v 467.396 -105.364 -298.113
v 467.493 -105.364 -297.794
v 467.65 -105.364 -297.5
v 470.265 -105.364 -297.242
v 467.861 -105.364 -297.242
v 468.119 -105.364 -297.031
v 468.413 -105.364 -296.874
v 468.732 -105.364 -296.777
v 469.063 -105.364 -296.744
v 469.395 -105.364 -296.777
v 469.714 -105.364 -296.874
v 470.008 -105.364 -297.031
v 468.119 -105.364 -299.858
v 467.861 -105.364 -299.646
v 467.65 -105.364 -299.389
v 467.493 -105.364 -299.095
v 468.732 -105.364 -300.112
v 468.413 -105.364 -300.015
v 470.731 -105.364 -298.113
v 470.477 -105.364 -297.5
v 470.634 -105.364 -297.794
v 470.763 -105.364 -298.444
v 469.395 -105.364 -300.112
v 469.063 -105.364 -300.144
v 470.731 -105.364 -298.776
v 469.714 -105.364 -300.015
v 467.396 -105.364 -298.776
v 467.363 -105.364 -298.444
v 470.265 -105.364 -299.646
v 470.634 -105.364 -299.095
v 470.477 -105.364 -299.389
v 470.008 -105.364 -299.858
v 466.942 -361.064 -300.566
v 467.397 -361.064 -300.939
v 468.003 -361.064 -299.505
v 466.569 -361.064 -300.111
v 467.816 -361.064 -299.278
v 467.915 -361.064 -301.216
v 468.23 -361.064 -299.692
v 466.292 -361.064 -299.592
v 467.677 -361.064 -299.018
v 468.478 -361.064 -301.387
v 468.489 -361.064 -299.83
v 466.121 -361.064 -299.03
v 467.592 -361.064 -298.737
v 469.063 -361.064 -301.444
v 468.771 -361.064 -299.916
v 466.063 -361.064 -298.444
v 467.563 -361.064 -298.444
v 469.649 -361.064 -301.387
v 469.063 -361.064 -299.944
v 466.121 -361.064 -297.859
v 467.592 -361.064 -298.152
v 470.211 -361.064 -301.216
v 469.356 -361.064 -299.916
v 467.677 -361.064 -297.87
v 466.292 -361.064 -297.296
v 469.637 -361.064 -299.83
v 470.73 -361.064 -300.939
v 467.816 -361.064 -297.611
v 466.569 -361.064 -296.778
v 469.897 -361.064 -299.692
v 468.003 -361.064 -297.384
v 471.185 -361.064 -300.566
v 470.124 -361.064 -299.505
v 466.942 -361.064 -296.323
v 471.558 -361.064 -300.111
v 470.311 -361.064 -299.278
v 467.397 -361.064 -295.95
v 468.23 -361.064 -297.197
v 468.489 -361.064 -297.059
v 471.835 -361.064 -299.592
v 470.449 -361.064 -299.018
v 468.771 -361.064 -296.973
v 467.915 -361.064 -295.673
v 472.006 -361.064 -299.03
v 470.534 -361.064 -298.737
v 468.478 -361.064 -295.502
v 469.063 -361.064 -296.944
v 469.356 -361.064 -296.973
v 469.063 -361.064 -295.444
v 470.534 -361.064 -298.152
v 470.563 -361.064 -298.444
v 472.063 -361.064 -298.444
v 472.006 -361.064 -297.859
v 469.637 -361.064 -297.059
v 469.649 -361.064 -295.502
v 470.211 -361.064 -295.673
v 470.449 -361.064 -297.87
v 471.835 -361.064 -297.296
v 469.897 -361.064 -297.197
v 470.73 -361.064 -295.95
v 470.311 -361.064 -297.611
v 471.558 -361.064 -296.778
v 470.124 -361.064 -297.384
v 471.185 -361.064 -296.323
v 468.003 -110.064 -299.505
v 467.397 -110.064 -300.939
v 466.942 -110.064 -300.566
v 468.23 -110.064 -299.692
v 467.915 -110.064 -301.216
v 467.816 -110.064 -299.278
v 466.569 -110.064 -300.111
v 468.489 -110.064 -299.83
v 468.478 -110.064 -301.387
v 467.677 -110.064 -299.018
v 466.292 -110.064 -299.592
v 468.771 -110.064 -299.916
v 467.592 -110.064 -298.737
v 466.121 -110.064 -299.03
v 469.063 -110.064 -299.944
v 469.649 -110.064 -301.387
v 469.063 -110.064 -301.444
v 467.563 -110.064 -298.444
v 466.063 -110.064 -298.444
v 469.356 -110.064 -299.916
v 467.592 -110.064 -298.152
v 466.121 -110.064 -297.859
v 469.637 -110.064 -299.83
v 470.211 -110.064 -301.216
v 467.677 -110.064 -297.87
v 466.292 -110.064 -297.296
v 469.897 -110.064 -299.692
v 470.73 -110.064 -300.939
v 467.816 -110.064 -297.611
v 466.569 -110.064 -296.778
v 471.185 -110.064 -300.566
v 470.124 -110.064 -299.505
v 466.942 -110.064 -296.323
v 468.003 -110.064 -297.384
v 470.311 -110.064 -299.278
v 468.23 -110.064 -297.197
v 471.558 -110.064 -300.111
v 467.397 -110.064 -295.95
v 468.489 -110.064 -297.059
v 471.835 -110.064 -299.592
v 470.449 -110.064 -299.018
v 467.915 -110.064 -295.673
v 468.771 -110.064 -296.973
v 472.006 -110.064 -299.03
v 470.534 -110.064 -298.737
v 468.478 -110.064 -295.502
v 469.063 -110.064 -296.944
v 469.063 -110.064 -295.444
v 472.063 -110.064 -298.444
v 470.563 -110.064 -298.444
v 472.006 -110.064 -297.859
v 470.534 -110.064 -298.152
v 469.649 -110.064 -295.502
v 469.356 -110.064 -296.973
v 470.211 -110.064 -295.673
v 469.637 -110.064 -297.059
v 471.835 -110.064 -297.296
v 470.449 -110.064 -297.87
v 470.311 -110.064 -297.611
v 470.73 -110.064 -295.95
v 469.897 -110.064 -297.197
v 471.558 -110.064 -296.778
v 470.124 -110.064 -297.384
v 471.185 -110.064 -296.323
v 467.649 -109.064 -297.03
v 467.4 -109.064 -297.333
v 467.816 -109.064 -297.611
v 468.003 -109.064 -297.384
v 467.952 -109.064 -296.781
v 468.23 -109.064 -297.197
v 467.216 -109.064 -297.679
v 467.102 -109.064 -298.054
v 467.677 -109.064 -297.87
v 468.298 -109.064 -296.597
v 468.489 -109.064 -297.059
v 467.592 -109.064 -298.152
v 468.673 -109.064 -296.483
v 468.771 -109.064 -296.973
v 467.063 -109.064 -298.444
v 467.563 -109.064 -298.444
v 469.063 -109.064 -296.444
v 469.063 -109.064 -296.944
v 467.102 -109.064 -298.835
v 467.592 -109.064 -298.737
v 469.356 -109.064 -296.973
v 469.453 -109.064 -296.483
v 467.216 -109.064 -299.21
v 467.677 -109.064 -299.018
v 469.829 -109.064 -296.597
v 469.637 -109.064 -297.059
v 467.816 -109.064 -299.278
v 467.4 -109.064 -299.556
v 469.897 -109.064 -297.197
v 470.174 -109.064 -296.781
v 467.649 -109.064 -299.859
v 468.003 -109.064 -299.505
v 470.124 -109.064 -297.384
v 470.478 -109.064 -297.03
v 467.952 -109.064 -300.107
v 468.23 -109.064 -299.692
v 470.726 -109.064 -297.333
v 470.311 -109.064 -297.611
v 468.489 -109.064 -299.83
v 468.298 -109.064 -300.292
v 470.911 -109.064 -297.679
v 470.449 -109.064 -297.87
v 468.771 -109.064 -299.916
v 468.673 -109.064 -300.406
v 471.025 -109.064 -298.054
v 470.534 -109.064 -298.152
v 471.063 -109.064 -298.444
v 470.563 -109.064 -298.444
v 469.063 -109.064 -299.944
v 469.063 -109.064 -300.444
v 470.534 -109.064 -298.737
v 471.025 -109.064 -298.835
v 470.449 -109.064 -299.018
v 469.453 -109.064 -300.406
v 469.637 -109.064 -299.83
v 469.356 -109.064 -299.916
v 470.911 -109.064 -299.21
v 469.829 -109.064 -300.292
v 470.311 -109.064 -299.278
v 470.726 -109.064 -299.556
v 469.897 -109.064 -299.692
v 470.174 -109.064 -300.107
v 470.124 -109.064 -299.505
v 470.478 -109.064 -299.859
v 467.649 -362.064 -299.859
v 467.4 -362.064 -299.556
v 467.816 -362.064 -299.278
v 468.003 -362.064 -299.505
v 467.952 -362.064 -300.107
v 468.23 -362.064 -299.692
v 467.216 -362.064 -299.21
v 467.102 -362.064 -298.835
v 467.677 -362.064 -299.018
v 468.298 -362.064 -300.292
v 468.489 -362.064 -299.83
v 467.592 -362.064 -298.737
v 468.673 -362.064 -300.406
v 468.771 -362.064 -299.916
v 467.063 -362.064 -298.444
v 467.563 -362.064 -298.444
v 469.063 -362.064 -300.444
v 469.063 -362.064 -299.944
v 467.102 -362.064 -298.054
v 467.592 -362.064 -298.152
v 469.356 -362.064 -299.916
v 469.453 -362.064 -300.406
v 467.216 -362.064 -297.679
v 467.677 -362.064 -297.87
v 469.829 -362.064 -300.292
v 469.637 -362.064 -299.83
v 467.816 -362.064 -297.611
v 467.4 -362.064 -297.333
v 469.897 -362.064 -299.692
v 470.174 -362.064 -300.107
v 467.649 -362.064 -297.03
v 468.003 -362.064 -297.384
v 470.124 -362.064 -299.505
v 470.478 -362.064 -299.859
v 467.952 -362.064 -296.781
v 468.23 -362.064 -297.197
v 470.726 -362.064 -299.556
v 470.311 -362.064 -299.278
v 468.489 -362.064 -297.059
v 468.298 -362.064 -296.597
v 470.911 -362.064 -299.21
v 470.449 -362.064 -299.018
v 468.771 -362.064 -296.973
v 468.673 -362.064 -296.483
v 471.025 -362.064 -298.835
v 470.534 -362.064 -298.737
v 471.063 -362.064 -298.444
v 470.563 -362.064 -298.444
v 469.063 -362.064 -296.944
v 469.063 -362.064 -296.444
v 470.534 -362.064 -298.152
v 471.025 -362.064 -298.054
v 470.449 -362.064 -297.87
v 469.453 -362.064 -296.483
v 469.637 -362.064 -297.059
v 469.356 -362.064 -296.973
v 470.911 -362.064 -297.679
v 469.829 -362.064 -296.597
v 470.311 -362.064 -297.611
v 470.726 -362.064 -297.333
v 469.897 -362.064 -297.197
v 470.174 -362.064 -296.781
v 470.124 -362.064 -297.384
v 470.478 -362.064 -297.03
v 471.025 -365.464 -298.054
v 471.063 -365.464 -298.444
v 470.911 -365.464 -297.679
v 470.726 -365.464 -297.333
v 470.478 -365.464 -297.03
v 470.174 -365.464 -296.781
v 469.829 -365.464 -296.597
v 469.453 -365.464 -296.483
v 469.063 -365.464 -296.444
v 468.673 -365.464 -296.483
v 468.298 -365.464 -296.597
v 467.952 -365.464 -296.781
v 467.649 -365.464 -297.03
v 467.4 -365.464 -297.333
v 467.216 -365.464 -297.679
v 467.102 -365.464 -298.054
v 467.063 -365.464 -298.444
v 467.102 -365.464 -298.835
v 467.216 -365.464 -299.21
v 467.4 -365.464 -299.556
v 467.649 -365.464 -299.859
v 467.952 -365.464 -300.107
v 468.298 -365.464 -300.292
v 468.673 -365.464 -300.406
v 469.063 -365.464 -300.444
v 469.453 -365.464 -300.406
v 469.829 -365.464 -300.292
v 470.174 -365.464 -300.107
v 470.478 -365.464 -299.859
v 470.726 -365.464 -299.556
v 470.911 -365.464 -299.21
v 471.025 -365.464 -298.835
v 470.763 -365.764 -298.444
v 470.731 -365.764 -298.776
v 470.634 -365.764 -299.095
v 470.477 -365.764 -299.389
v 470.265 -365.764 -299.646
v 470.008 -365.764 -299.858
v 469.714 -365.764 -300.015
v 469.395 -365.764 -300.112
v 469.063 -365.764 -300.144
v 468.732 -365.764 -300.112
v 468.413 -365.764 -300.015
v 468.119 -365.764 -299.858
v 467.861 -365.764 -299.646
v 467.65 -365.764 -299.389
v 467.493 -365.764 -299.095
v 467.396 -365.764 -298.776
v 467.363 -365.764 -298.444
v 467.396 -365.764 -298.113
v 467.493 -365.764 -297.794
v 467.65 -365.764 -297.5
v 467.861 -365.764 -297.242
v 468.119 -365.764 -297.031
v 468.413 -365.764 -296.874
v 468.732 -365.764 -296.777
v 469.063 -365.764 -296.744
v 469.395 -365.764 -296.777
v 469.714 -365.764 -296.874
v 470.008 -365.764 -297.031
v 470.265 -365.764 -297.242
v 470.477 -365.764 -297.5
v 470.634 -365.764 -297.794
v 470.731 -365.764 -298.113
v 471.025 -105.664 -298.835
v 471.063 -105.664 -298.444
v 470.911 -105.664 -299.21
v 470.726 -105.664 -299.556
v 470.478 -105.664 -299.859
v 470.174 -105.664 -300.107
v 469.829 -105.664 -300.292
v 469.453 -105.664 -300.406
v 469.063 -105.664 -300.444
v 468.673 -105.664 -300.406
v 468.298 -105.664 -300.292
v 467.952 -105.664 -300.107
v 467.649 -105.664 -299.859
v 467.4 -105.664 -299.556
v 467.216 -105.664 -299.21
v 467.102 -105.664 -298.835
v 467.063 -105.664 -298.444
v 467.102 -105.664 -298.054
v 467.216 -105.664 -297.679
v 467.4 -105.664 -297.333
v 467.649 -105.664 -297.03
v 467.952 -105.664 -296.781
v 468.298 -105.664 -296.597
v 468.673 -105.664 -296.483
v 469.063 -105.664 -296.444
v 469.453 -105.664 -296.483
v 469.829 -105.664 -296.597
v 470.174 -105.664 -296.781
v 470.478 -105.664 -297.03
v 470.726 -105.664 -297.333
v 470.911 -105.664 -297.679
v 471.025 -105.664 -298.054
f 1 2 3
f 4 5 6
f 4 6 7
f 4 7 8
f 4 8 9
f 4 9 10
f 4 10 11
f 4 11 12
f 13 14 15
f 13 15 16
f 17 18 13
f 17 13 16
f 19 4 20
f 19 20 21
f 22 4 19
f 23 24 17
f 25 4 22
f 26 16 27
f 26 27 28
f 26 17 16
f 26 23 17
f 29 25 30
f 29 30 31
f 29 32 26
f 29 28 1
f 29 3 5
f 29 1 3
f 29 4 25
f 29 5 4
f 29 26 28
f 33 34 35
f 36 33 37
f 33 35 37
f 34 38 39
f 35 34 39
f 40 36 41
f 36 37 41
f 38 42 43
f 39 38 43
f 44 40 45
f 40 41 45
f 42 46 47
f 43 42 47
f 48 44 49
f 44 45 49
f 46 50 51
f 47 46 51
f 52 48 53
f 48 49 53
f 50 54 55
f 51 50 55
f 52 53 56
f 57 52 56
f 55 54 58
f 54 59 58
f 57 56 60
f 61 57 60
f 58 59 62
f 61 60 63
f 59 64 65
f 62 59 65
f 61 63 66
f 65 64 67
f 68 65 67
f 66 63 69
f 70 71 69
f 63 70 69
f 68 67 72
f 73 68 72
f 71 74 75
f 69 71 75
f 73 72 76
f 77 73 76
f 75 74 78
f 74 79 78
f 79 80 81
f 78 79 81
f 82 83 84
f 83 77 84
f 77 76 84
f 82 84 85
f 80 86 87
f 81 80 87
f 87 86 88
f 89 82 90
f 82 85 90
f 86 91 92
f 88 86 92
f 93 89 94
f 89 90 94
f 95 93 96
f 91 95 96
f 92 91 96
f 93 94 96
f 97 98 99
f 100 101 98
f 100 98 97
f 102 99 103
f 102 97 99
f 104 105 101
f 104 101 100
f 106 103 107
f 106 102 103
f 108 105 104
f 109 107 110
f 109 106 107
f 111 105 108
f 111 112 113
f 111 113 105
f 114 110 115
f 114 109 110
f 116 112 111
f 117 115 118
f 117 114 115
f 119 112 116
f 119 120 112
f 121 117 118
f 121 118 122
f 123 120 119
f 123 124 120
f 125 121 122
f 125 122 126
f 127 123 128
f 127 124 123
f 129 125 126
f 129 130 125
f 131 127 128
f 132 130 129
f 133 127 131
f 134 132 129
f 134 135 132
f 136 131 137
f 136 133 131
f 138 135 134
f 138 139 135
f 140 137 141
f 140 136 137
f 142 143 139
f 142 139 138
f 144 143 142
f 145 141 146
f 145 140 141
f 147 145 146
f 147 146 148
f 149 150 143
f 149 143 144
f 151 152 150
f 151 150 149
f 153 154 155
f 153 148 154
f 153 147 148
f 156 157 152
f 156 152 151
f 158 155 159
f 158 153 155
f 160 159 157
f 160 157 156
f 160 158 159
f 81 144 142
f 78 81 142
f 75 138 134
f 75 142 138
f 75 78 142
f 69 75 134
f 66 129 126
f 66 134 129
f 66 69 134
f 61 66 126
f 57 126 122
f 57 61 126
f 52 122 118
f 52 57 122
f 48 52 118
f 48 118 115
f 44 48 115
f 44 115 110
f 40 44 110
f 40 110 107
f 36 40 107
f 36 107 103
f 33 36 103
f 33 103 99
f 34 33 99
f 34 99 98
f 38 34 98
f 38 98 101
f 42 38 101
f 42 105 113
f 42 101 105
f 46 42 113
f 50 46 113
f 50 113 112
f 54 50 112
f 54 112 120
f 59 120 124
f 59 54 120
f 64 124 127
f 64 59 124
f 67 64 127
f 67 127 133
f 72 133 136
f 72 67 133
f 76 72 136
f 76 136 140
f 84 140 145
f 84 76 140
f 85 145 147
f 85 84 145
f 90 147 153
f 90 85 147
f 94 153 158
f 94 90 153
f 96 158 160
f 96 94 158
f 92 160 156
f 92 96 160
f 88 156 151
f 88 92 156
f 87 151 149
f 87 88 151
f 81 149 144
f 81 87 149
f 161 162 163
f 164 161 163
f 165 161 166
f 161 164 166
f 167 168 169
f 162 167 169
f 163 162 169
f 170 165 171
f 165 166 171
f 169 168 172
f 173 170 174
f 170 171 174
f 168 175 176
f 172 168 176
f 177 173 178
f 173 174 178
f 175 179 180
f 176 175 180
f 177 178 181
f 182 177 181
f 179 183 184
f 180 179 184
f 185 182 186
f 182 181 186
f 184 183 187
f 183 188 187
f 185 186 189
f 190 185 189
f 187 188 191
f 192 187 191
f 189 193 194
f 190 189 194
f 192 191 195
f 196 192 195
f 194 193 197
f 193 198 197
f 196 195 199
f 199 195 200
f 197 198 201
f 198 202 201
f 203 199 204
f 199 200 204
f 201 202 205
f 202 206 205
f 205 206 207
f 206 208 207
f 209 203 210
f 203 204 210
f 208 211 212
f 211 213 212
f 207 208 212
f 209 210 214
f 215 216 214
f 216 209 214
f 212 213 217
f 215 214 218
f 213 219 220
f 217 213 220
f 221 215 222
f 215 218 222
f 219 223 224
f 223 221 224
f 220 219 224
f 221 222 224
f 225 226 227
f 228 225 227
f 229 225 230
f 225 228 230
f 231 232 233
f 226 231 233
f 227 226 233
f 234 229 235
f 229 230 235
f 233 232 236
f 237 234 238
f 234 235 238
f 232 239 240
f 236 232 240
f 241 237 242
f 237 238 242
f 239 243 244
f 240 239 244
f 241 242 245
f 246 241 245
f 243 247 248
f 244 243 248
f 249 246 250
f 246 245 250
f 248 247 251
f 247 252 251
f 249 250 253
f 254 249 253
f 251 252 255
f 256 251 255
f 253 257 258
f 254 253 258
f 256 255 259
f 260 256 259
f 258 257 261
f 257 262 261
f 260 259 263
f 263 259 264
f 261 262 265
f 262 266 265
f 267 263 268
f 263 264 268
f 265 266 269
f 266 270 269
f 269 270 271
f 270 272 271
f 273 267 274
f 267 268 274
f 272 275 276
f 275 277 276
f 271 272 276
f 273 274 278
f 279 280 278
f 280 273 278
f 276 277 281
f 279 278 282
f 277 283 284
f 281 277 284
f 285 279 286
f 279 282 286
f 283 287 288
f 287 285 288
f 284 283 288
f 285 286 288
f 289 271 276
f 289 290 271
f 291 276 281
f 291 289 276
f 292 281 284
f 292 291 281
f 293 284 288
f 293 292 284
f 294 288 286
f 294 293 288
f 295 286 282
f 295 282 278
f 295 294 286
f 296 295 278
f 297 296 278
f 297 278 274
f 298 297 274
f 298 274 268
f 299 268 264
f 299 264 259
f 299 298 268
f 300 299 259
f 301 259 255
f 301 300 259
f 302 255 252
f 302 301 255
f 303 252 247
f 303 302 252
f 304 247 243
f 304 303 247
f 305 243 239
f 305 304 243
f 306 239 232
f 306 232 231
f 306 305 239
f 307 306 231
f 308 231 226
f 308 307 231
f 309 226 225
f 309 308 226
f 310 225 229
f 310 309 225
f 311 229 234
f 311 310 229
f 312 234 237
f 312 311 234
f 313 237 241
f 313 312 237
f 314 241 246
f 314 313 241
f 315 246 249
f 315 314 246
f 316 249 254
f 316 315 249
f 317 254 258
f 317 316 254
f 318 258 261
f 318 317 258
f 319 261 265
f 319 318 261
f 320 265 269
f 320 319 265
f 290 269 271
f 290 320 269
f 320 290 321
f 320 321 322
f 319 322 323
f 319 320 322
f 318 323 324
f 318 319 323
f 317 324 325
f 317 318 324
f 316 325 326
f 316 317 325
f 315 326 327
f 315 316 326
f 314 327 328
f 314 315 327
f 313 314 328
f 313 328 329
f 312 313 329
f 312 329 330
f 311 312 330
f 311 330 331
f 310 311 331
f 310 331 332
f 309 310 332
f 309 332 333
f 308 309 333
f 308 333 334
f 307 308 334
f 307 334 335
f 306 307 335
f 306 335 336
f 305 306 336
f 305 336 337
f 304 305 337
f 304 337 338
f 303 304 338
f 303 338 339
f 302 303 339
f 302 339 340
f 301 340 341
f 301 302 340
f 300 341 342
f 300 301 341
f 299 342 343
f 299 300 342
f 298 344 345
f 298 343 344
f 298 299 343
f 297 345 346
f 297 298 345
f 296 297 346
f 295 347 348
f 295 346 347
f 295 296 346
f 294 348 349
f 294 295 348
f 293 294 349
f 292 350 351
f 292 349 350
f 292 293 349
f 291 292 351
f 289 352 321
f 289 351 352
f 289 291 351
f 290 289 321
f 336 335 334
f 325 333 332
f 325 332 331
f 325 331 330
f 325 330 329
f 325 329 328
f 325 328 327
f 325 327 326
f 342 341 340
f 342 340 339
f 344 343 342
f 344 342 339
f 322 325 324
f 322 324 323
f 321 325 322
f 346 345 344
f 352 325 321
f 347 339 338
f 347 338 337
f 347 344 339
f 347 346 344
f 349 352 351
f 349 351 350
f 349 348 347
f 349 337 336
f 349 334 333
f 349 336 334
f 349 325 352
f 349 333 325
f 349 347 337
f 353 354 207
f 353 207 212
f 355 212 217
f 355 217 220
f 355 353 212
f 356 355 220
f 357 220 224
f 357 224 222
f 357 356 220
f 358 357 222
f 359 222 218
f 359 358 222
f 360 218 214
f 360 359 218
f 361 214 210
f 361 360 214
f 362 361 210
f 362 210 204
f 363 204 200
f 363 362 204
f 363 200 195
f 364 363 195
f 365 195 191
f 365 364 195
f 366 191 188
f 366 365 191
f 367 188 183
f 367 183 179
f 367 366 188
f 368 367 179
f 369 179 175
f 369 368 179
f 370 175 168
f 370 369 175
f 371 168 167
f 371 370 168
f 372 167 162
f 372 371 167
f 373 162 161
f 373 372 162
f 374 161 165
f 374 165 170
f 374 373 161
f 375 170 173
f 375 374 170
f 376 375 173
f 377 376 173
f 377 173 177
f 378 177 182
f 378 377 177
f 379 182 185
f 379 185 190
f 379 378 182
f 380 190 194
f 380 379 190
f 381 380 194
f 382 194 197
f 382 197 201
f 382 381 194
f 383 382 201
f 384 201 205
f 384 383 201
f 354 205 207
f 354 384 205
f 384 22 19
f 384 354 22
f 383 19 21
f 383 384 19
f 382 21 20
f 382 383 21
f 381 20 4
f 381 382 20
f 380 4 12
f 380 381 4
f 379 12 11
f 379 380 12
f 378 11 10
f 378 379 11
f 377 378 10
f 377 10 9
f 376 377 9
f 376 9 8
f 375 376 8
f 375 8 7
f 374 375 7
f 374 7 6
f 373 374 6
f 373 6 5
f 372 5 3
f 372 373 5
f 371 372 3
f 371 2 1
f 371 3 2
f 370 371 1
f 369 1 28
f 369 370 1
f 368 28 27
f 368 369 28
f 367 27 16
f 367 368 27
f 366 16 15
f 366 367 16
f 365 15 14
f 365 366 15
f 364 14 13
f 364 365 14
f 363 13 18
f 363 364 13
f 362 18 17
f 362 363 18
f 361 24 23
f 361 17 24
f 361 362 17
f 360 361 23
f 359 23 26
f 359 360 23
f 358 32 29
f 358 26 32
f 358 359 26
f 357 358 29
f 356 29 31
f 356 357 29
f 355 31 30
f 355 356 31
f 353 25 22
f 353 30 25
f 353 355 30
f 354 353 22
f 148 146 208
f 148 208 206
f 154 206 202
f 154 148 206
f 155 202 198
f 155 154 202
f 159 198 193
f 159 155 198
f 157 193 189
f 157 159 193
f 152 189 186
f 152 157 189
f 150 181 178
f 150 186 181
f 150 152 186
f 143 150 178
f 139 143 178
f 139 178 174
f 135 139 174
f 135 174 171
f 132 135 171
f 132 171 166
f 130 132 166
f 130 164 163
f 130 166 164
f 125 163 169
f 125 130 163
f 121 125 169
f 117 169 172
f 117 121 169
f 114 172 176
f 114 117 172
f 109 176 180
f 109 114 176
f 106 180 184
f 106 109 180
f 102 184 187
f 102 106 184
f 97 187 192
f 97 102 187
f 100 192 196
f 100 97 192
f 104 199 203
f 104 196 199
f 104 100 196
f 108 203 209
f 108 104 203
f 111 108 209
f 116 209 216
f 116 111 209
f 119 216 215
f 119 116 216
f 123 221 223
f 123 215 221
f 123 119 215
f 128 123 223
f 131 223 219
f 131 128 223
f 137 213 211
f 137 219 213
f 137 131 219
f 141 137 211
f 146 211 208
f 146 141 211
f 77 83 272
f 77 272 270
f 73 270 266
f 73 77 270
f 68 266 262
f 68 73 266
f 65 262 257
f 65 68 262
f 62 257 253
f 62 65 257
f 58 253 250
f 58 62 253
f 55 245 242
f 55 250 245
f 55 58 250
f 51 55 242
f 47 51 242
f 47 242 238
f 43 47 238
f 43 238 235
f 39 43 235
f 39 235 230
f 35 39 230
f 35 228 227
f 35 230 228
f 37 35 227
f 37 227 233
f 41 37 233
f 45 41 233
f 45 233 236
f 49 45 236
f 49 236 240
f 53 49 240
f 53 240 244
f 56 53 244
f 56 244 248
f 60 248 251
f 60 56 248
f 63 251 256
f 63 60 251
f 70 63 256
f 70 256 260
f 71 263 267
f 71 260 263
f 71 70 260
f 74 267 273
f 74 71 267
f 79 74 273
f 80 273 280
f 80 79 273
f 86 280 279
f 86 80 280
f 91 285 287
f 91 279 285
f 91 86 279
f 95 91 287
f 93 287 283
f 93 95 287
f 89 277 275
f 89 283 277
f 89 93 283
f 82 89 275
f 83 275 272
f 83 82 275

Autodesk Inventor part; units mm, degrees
ref_plane "YZ Plane" through (0, 0, 0) normal (1, 0, 0) x (0, 1, 0)
ref_plane "XZ Plane" through (0, 0, 0) normal (0, 1, 0) x (-1, 0, 0)
ref_plane "XY Plane" through (0, 0, 0) normal (0, 0, 1) x (1, 0, 0)
ref_plane "Work Plane1" through (469.0633, -361.0645, -298.4444) normal (0, 1, 0) x (0, 0, 1)
sketch "Sketch2" plane through (469.0633, -361.0645, -298.4444) normal (0, 1, 0) x (0, 0, 1)
  circle A0 centre (0, 0) radius 3
  point P0 (298.4444, -469.0633)
  dimension "d6" = 6
extrude "Extrusion1" add sketch "Sketch2" along normal blind 251
sketch "Sketch5" plane through (469.0633, -110.0645, -298.4444) normal (0, 1, 0) x (1, 0, 0)
  circle A0 centre (0, 0) radius 3 projected
  circle A1 centre (0, 0) radius 1.5
  point P0 (-469.0633, -298.4444)
  dimension "d26" = 3
extrude "Extrusion2" add sketch "Sketch5" along normal blind 4.7 contours A1
sketch "Sketch6" plane through (469.0633, -105.3645, -298.4444) normal (0, 1, 0) x (1, 0, 0)
  circle A0 centre (0, 0) radius 1.5 projected
  circle A1 centre (0, 0) radius 2
  point P0 (-469.0633, -298.4444)
  dimension "d29" = 4
extrude "Extrusion3" add sketch "Sketch6" against normal blind 3.7
thread "Thread1" size "M4x0.7" class "6g" standard "ANSI Metric M Profile" full length
chamfer "Chamfer2" distance 0.3 angle 45 1 edges at (467.0633, -105.3645, -298.4444)
sketch "Sketch7" plane through (469.0633, -361.0645, -298.4444) normal (0, -1, 0) x (1, 0, 0)
  circle A0 centre (0, 0) radius 3 projected
  circle A1 centre (0, 0) radius 1.5
  point P0 (-469.0633, 298.4444)
  dimension "d37" = 3
extrude "Extrusion4" add sketch "Sketch7" along normal blind 4.7 contours A1
sketch "Sketch8" plane through (469.0633, -365.7645, -298.4444) normal (0, -1, 0) x (1, 0, 0)
  circle A0 centre (0, 0) radius 1.5 projected
  circle A1 centre (0, 0) radius 2
  point P0 (-469.0633, 298.4444)
  dimension "d40" = 4
extrude "Extrusion5" add sketch "Sketch8" against normal blind 3.7
thread "Thread2" size "M4x0.7" class "6g" standard "ANSI Metric M Profile" full length
chamfer "Chamfer3" distance 0.3 angle 45 1 edges at (467.0633, -365.7645, -298.4444)
properties material "Aluminum 6061"
